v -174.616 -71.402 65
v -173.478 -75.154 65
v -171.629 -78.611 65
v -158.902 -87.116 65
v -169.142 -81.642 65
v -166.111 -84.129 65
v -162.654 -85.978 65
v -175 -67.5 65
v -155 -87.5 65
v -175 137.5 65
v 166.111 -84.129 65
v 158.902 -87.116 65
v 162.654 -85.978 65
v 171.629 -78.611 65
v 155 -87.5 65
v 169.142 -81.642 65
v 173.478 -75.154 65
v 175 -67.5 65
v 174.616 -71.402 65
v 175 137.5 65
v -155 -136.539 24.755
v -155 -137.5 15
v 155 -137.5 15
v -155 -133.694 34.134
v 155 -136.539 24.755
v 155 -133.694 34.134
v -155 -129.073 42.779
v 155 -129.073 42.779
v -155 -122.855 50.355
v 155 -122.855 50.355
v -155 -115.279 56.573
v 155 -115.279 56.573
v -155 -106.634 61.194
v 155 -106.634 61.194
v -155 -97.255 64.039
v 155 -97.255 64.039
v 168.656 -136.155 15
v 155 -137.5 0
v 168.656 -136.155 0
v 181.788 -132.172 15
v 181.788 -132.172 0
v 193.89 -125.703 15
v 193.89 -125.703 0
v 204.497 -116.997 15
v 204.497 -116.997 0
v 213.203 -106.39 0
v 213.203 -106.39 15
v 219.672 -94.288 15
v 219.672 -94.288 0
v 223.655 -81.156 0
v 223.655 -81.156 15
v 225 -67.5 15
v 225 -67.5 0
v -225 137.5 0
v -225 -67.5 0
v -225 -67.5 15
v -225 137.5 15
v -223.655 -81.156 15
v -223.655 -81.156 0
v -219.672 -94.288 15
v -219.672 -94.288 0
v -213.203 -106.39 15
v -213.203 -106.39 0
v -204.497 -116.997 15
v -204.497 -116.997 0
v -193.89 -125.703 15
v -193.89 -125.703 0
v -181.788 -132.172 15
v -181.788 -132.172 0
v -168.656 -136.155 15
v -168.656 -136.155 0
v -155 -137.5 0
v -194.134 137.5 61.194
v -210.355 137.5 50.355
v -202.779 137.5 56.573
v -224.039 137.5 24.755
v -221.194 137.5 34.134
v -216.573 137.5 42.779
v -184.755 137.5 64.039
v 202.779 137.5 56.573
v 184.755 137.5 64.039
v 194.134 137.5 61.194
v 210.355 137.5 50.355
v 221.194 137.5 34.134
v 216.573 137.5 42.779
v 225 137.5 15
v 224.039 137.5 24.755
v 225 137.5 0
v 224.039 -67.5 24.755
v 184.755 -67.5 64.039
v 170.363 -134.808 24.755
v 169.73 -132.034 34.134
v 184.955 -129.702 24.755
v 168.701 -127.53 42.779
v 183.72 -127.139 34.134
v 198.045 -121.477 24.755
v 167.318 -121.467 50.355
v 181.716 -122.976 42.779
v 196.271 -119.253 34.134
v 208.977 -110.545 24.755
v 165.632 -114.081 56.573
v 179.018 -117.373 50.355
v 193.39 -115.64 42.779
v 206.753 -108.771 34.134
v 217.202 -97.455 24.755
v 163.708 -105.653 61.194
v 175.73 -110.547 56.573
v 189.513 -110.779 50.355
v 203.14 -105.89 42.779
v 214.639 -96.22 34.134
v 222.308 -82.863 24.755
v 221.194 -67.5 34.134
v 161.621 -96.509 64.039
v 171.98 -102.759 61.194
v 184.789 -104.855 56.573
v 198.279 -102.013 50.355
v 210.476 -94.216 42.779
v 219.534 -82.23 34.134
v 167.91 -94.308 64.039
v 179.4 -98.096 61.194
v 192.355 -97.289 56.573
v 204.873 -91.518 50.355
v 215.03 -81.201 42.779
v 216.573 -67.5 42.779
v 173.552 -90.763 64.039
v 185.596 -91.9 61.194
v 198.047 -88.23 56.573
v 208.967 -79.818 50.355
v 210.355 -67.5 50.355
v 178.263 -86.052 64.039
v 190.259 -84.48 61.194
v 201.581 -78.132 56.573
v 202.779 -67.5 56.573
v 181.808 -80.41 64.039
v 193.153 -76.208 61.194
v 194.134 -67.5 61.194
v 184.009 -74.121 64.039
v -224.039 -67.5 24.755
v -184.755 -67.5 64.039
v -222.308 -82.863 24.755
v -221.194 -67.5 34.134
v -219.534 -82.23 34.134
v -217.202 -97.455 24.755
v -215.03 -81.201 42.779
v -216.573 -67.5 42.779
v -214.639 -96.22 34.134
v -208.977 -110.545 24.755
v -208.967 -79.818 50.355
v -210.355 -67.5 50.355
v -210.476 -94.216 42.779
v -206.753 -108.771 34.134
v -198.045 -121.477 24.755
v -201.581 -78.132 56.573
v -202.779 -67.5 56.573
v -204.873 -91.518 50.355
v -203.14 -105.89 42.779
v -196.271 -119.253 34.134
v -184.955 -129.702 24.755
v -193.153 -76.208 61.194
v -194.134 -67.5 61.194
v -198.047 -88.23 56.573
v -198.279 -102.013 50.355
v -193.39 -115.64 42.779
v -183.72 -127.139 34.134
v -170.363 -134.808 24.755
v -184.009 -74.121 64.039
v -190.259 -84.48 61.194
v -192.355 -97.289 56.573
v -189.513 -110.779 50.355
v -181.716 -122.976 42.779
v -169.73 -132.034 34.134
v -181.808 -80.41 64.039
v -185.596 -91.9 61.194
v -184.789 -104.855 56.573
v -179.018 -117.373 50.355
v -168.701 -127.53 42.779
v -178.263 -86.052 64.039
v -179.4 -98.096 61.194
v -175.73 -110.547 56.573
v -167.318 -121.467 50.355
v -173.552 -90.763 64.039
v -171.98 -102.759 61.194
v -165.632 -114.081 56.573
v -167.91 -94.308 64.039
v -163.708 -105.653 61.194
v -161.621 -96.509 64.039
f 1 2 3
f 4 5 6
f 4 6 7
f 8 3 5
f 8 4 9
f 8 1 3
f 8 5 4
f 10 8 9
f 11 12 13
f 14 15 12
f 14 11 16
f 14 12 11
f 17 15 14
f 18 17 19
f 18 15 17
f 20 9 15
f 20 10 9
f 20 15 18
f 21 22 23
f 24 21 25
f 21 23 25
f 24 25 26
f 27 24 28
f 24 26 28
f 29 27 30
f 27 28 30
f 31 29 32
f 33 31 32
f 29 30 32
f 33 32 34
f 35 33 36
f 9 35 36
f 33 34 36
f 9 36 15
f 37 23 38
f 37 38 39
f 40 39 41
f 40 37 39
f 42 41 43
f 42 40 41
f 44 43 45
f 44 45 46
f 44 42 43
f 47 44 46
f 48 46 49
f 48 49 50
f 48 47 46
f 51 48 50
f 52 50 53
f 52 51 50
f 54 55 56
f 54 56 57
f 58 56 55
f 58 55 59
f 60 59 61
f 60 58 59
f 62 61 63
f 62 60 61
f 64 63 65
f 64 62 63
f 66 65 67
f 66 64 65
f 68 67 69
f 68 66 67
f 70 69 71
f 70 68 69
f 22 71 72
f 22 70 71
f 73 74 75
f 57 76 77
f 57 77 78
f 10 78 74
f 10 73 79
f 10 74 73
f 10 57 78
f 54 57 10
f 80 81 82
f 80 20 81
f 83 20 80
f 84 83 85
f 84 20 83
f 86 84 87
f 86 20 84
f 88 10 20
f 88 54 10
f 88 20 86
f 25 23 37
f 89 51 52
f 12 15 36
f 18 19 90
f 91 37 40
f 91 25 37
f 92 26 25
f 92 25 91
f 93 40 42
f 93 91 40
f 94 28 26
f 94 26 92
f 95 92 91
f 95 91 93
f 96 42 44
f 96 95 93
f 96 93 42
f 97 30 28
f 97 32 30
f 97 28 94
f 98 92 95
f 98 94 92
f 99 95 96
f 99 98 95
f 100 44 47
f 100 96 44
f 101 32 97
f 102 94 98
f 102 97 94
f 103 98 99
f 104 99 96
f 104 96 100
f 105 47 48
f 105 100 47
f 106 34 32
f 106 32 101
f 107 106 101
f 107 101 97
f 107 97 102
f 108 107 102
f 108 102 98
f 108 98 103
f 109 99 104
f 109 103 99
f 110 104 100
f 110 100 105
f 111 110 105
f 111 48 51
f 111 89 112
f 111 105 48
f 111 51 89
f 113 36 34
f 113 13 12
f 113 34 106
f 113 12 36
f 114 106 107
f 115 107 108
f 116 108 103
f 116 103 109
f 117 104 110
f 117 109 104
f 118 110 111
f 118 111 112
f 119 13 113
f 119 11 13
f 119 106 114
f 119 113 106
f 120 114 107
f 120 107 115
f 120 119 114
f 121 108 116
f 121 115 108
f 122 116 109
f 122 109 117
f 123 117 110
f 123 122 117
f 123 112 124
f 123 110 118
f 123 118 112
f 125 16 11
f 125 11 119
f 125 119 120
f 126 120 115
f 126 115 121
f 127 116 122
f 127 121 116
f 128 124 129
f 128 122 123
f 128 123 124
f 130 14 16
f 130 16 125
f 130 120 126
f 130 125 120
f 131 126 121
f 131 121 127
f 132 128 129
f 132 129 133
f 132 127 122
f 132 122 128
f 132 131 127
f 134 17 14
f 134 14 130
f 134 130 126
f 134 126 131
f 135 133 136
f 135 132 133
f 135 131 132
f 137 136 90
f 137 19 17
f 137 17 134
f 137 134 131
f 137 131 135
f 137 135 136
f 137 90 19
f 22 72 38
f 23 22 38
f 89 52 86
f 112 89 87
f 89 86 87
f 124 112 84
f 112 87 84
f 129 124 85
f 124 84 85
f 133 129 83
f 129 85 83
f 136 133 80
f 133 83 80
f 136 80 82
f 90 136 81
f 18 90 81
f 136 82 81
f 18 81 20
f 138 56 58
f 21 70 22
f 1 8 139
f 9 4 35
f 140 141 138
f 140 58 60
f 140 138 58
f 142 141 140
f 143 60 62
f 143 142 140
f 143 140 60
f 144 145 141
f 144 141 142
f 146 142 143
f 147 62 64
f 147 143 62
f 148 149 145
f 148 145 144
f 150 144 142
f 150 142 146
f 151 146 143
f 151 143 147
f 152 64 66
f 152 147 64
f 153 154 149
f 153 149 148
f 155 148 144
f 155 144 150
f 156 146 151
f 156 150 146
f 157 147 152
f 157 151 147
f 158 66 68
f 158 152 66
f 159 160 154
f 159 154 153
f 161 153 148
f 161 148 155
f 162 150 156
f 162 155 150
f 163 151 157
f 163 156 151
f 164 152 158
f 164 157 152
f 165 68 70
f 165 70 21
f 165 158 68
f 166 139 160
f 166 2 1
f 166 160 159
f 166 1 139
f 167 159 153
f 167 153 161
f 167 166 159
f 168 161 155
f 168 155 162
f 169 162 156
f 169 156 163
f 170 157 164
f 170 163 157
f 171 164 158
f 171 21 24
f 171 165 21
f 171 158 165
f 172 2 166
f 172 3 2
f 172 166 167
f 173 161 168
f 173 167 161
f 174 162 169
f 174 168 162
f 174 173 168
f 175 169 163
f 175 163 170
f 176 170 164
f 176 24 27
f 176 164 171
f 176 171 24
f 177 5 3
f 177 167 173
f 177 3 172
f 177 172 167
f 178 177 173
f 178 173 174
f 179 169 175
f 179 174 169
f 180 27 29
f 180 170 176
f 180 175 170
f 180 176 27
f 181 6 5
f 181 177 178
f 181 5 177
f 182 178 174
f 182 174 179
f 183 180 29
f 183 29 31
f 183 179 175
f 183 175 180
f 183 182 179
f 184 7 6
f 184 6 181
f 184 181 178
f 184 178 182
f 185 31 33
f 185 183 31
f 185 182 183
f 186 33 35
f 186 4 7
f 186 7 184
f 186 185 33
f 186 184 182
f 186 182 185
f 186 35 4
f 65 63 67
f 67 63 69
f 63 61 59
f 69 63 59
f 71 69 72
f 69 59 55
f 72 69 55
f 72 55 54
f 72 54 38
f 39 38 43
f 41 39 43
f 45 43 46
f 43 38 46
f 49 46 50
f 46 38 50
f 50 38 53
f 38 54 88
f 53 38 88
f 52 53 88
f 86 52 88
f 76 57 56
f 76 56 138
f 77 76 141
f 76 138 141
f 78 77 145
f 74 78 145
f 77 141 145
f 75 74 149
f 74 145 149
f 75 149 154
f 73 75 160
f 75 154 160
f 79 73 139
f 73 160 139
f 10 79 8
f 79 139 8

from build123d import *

# Parameters (mm, degrees)
CROQUIS1_W              = 450
CROQUIS1_H              = 275
SALIENTE_EXTRUIR1_DEPTH = 65
REDONDEO1_R             = 70
REDONDEO2_R             = 70
REDONDEO3_R             = 50


with BuildPart() as part:
    # Croquis1 → Saliente-Extruir1 (new body)
    with BuildSketch(Plane.XY):
        Rectangle(CROQUIS1_W, CROQUIS1_H)
    extrude(amount=SALIENTE_EXTRUIR1_DEPTH)

    # Redondeo1
    redondeo1_edges = [part.edges().sort_by_distance(p)[0] for p in [
        (-225, -137.5, 32.5),
    ]]
    fillet(redondeo1_edges, radius=REDONDEO1_R)

    # Redondeo2
    redondeo2_edges = [part.edges().sort_by_distance(p)[0] for p in [
        (225, -137.5, 32.5),
    ]]
    fillet(redondeo2_edges, radius=REDONDEO2_R)

    # Redondeo3
    redondeo3_edges = [part.edges().sort_by_distance(p)[0] for p in [
        (0, -137.5, 65),
        (-225, 35, 65),
        (-204.497474683, -116.997474683, 65),
        (225, 35, 65),
        (204.497474683, -116.997474683, 65),
    ]]
    fillet(redondeo3_edges, radius=REDONDEO3_R)


solid = part.part
